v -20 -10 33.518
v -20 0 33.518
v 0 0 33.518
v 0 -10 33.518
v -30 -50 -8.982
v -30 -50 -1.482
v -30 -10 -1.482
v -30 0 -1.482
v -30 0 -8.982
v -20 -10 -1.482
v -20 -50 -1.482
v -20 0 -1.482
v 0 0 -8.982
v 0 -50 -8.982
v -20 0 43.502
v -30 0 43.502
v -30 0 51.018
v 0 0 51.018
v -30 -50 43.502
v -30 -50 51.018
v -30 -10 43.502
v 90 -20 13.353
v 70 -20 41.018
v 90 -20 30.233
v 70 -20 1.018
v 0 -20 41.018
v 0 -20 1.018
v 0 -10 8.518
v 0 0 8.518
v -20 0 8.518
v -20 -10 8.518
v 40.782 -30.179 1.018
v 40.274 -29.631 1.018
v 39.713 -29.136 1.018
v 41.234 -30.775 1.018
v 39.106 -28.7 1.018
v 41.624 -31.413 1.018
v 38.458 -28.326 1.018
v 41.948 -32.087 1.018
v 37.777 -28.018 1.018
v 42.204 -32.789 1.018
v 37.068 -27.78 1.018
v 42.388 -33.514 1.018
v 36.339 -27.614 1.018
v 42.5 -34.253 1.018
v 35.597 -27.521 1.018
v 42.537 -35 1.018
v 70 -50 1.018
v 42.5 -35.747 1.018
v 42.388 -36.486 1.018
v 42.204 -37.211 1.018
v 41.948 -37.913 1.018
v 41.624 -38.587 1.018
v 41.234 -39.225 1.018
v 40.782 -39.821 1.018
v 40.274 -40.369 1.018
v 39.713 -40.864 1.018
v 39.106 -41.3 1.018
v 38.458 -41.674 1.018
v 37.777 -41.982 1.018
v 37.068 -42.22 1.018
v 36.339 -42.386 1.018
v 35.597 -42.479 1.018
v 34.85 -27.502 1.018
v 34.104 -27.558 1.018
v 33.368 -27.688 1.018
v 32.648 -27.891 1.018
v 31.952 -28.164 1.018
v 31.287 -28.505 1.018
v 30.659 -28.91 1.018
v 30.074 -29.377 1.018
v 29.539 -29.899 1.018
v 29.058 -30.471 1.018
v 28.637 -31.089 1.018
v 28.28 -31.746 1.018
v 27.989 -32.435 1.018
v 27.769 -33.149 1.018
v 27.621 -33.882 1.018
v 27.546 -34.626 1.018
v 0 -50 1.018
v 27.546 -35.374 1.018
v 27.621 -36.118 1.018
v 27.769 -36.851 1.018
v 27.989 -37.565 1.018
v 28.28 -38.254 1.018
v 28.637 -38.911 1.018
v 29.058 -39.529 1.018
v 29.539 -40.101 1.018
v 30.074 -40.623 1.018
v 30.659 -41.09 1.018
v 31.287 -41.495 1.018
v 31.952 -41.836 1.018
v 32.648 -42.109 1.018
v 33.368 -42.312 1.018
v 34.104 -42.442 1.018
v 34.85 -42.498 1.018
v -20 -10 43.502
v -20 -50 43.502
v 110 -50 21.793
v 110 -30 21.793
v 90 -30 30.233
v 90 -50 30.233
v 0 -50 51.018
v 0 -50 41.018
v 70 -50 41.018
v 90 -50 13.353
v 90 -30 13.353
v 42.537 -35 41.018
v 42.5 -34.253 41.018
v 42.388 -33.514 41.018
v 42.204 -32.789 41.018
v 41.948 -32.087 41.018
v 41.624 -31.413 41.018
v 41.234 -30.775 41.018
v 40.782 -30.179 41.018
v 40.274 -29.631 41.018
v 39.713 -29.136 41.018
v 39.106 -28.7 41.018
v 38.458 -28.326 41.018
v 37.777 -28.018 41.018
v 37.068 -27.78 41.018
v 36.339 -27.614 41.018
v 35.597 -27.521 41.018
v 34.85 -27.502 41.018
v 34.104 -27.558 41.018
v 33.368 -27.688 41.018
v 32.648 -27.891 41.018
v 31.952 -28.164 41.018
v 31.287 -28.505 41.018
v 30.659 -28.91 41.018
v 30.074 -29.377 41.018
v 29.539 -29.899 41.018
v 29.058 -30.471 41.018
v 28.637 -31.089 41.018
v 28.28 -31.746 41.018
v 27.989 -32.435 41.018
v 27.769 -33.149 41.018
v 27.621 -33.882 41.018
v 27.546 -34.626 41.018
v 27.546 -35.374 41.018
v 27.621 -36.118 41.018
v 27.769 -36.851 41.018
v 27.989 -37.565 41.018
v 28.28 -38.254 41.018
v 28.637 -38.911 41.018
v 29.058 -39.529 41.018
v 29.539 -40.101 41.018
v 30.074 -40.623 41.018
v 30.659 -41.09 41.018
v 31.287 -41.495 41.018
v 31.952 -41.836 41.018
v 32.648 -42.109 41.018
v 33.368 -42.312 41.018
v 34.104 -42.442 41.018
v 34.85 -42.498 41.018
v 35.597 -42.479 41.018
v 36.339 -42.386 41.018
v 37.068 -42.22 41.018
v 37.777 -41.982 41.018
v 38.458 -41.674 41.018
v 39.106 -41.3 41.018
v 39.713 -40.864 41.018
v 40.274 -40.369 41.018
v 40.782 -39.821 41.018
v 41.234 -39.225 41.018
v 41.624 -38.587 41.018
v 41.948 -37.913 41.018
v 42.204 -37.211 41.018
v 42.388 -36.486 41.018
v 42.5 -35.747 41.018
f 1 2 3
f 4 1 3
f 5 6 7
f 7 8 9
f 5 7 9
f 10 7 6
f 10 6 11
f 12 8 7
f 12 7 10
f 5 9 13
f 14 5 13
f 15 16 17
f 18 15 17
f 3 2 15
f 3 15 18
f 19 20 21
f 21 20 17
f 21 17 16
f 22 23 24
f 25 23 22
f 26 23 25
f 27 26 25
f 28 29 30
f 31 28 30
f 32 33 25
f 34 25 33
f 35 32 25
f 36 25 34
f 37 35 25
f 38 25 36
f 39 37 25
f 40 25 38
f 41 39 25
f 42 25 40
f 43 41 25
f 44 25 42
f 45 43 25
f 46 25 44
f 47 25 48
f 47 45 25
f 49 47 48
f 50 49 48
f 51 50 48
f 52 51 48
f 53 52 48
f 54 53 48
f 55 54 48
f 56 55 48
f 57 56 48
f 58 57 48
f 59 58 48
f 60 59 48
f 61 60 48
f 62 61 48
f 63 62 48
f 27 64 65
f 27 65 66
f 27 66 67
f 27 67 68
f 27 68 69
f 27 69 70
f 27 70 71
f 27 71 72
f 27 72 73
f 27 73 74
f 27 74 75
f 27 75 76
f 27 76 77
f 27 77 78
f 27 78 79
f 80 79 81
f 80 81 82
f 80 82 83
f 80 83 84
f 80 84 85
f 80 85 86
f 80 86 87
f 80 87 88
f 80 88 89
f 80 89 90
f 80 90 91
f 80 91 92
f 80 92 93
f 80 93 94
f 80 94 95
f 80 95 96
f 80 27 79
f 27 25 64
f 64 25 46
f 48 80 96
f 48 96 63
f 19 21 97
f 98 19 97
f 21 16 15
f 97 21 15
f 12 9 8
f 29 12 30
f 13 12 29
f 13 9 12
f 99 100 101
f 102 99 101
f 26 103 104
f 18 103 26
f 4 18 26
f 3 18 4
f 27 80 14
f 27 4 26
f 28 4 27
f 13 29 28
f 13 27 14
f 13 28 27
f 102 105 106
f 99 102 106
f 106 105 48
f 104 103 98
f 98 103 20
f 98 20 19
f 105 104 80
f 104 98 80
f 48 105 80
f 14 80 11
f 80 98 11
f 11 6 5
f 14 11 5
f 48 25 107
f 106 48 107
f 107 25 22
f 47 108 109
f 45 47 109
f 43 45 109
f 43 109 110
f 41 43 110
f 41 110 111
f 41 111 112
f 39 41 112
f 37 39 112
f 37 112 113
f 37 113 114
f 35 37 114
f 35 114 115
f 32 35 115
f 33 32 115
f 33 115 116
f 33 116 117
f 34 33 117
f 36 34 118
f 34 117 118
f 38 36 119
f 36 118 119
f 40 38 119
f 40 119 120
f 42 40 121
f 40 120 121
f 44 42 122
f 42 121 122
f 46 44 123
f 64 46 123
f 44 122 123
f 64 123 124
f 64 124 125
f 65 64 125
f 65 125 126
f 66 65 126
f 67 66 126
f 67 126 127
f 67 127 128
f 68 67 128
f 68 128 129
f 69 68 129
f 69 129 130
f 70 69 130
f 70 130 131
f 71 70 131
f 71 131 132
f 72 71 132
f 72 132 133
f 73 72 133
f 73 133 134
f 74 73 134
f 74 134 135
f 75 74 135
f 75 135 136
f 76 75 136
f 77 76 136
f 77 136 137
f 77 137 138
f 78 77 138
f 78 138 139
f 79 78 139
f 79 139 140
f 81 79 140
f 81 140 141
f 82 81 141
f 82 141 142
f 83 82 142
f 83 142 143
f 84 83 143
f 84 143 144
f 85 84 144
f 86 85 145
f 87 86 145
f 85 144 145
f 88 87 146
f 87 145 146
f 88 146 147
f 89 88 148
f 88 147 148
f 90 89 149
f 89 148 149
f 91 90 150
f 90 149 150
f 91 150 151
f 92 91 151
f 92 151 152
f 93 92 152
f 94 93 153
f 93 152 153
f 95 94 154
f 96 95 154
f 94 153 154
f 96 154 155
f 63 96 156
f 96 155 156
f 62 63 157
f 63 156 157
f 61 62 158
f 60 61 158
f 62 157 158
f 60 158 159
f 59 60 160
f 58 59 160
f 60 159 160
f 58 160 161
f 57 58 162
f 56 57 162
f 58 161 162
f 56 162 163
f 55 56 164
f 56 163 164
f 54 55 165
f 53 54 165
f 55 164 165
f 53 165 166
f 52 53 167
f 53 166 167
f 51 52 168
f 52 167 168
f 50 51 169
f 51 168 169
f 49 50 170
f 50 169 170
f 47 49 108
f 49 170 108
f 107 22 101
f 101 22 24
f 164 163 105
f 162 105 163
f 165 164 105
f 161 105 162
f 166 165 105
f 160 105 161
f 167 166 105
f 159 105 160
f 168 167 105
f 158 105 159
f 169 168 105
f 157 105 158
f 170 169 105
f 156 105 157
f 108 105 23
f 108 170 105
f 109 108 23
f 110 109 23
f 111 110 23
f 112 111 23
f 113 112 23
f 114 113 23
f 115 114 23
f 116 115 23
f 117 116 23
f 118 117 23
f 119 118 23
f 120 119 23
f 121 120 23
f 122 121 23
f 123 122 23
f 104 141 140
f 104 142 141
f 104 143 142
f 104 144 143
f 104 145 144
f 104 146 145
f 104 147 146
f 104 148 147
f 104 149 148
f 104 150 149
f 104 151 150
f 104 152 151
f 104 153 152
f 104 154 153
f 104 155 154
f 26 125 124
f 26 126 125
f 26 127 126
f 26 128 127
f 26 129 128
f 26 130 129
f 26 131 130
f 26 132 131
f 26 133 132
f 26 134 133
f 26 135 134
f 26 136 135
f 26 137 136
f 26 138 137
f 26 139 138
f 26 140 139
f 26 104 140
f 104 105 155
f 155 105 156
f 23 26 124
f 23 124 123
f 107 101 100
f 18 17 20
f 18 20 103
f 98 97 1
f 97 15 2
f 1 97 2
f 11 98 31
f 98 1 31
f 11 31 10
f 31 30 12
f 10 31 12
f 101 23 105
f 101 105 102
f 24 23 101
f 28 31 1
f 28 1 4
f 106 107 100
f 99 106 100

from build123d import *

# Parameters (mm, degrees)
SKETCH1_W           = 30
SKETCH1_H           = 60
BOSS_EXTRUDE1_DEPTH = 50
BOSS_EXTRUDE2_DEPTH = 90
SKETCH3_R           = 7.5
CUT_EXTRUDE1_DEPTH  = 90
CUT_EXTRUDE2_DEPTH  = 90
SKETCH5_W           = 16.87997937
SKETCH5_H           = 20
BOSS_EXTRUDE3_DEPTH = 20
CUT_EXTRUDE3_DEPTH  = 20
CUT_EXTRUDE4_DEPTH  = 10
SKETCH8_W           = 10
SKETCH8_H           = 44.983560701
CUT_EXTRUDE5_DEPTH  = 50


with BuildPart() as part:
    # Sketch1 → Boss-Extrude1 (new body)
    with BuildSketch(Plane(origin=(0, 0, 0), x_dir=(1, 0, 0), z_dir=(0, 1, 0))):
        with Locations((-15, -21.017964072)):
            Rectangle(SKETCH1_W, SKETCH1_H)
    extrude(amount=-BOSS_EXTRUDE1_DEPTH)

    # Sketch2 → Boss-Extrude2 (add)
    with BuildSketch(Plane(origin=(0, 0, 0), x_dir=(0, 0, -1), z_dir=(1, 0, 0))):
        Polygon((-21.017964072, -50), (-41.017964072, -50), (-41.017964072, -20), (-1.017964072, -20), (-1.017964072, -50), align=None)
    extrude(amount=BOSS_EXTRUDE2_DEPTH)

    # Sketch3 → Cut-Extrude1 (cut)
    with BuildSketch(Plane.XY.offset(41.017964072)):
        with Locations((35.036901586, -35)):
            Circle(SKETCH3_R)
    extrude(amount=-CUT_EXTRUDE1_DEPTH, mode=Mode.SUBTRACT)

    # Sketch4 → Cut-Extrude2 (cut)
    with BuildSketch(Plane(origin=(0, -20, 0), x_dir=(1, 0, 0), z_dir=(0, 1, 0))):
        Polygon((70, -1.017964072), (90, -13.353113833), (90, -1.017964072), align=None)
        Polygon((70, -41.017964072), (90, -30.233093203), (90, -41.017964072), align=None)
    extrude(amount=-CUT_EXTRUDE2_DEPTH, mode=Mode.SUBTRACT)

    # Sketch5 → Boss-Extrude3 (add)
    with BuildSketch(Plane(origin=(90, 0, 0), x_dir=(0, 0, -1), z_dir=(1, 0, 0))):
        with Locations((-21.793103518, -40)):
            Rectangle(SKETCH5_W, SKETCH5_H)
    extrude(amount=BOSS_EXTRUDE3_DEPTH)

    # Sketch6 → Cut-Extrude3 (cut)
    with BuildSketch(Plane(origin=(0, -30, 0), x_dir=(1, 0, 0), z_dir=(0, 1, 0))):
        Polygon((110, -13.353113833), (90, -13.353113833), (110, -21.793103518), align=None)
        Polygon((110, -30.233093203), (110, -21.793103518), (90, -30.233093203), align=None)
    extrude(amount=-CUT_EXTRUDE3_DEPTH, mode=Mode.SUBTRACT)

    # Sketch7 → Cut-Extrude4 (cut)
    with BuildSketch(Plane(origin=(0, 0, 0), x_dir=(1, 0, 0), z_dir=(0, 1, 0))):
        Polygon((-30, 1.482035928), (-30, -43.501524773), (-20, -43.501524773), (-20, -33.517964072), (0, -33.517964072), (0, -8.517964072), (-20, -8.517964072), (-20, 1.482035928), align=None)
    extrude(amount=-CUT_EXTRUDE4_DEPTH, mode=Mode.SUBTRACT)

    # Sketch8 → Cut-Extrude5 (cut)
    with BuildSketch(Plane(origin=(0, -10, 0), x_dir=(1, 0, 0), z_dir=(0, 1, 0))):
        with Locations((-25, -21.009744422)):
            Rectangle(SKETCH8_W, SKETCH8_H)
    extrude(amount=-CUT_EXTRUDE5_DEPTH, mode=Mode.SUBTRACT)


solid = part.part
